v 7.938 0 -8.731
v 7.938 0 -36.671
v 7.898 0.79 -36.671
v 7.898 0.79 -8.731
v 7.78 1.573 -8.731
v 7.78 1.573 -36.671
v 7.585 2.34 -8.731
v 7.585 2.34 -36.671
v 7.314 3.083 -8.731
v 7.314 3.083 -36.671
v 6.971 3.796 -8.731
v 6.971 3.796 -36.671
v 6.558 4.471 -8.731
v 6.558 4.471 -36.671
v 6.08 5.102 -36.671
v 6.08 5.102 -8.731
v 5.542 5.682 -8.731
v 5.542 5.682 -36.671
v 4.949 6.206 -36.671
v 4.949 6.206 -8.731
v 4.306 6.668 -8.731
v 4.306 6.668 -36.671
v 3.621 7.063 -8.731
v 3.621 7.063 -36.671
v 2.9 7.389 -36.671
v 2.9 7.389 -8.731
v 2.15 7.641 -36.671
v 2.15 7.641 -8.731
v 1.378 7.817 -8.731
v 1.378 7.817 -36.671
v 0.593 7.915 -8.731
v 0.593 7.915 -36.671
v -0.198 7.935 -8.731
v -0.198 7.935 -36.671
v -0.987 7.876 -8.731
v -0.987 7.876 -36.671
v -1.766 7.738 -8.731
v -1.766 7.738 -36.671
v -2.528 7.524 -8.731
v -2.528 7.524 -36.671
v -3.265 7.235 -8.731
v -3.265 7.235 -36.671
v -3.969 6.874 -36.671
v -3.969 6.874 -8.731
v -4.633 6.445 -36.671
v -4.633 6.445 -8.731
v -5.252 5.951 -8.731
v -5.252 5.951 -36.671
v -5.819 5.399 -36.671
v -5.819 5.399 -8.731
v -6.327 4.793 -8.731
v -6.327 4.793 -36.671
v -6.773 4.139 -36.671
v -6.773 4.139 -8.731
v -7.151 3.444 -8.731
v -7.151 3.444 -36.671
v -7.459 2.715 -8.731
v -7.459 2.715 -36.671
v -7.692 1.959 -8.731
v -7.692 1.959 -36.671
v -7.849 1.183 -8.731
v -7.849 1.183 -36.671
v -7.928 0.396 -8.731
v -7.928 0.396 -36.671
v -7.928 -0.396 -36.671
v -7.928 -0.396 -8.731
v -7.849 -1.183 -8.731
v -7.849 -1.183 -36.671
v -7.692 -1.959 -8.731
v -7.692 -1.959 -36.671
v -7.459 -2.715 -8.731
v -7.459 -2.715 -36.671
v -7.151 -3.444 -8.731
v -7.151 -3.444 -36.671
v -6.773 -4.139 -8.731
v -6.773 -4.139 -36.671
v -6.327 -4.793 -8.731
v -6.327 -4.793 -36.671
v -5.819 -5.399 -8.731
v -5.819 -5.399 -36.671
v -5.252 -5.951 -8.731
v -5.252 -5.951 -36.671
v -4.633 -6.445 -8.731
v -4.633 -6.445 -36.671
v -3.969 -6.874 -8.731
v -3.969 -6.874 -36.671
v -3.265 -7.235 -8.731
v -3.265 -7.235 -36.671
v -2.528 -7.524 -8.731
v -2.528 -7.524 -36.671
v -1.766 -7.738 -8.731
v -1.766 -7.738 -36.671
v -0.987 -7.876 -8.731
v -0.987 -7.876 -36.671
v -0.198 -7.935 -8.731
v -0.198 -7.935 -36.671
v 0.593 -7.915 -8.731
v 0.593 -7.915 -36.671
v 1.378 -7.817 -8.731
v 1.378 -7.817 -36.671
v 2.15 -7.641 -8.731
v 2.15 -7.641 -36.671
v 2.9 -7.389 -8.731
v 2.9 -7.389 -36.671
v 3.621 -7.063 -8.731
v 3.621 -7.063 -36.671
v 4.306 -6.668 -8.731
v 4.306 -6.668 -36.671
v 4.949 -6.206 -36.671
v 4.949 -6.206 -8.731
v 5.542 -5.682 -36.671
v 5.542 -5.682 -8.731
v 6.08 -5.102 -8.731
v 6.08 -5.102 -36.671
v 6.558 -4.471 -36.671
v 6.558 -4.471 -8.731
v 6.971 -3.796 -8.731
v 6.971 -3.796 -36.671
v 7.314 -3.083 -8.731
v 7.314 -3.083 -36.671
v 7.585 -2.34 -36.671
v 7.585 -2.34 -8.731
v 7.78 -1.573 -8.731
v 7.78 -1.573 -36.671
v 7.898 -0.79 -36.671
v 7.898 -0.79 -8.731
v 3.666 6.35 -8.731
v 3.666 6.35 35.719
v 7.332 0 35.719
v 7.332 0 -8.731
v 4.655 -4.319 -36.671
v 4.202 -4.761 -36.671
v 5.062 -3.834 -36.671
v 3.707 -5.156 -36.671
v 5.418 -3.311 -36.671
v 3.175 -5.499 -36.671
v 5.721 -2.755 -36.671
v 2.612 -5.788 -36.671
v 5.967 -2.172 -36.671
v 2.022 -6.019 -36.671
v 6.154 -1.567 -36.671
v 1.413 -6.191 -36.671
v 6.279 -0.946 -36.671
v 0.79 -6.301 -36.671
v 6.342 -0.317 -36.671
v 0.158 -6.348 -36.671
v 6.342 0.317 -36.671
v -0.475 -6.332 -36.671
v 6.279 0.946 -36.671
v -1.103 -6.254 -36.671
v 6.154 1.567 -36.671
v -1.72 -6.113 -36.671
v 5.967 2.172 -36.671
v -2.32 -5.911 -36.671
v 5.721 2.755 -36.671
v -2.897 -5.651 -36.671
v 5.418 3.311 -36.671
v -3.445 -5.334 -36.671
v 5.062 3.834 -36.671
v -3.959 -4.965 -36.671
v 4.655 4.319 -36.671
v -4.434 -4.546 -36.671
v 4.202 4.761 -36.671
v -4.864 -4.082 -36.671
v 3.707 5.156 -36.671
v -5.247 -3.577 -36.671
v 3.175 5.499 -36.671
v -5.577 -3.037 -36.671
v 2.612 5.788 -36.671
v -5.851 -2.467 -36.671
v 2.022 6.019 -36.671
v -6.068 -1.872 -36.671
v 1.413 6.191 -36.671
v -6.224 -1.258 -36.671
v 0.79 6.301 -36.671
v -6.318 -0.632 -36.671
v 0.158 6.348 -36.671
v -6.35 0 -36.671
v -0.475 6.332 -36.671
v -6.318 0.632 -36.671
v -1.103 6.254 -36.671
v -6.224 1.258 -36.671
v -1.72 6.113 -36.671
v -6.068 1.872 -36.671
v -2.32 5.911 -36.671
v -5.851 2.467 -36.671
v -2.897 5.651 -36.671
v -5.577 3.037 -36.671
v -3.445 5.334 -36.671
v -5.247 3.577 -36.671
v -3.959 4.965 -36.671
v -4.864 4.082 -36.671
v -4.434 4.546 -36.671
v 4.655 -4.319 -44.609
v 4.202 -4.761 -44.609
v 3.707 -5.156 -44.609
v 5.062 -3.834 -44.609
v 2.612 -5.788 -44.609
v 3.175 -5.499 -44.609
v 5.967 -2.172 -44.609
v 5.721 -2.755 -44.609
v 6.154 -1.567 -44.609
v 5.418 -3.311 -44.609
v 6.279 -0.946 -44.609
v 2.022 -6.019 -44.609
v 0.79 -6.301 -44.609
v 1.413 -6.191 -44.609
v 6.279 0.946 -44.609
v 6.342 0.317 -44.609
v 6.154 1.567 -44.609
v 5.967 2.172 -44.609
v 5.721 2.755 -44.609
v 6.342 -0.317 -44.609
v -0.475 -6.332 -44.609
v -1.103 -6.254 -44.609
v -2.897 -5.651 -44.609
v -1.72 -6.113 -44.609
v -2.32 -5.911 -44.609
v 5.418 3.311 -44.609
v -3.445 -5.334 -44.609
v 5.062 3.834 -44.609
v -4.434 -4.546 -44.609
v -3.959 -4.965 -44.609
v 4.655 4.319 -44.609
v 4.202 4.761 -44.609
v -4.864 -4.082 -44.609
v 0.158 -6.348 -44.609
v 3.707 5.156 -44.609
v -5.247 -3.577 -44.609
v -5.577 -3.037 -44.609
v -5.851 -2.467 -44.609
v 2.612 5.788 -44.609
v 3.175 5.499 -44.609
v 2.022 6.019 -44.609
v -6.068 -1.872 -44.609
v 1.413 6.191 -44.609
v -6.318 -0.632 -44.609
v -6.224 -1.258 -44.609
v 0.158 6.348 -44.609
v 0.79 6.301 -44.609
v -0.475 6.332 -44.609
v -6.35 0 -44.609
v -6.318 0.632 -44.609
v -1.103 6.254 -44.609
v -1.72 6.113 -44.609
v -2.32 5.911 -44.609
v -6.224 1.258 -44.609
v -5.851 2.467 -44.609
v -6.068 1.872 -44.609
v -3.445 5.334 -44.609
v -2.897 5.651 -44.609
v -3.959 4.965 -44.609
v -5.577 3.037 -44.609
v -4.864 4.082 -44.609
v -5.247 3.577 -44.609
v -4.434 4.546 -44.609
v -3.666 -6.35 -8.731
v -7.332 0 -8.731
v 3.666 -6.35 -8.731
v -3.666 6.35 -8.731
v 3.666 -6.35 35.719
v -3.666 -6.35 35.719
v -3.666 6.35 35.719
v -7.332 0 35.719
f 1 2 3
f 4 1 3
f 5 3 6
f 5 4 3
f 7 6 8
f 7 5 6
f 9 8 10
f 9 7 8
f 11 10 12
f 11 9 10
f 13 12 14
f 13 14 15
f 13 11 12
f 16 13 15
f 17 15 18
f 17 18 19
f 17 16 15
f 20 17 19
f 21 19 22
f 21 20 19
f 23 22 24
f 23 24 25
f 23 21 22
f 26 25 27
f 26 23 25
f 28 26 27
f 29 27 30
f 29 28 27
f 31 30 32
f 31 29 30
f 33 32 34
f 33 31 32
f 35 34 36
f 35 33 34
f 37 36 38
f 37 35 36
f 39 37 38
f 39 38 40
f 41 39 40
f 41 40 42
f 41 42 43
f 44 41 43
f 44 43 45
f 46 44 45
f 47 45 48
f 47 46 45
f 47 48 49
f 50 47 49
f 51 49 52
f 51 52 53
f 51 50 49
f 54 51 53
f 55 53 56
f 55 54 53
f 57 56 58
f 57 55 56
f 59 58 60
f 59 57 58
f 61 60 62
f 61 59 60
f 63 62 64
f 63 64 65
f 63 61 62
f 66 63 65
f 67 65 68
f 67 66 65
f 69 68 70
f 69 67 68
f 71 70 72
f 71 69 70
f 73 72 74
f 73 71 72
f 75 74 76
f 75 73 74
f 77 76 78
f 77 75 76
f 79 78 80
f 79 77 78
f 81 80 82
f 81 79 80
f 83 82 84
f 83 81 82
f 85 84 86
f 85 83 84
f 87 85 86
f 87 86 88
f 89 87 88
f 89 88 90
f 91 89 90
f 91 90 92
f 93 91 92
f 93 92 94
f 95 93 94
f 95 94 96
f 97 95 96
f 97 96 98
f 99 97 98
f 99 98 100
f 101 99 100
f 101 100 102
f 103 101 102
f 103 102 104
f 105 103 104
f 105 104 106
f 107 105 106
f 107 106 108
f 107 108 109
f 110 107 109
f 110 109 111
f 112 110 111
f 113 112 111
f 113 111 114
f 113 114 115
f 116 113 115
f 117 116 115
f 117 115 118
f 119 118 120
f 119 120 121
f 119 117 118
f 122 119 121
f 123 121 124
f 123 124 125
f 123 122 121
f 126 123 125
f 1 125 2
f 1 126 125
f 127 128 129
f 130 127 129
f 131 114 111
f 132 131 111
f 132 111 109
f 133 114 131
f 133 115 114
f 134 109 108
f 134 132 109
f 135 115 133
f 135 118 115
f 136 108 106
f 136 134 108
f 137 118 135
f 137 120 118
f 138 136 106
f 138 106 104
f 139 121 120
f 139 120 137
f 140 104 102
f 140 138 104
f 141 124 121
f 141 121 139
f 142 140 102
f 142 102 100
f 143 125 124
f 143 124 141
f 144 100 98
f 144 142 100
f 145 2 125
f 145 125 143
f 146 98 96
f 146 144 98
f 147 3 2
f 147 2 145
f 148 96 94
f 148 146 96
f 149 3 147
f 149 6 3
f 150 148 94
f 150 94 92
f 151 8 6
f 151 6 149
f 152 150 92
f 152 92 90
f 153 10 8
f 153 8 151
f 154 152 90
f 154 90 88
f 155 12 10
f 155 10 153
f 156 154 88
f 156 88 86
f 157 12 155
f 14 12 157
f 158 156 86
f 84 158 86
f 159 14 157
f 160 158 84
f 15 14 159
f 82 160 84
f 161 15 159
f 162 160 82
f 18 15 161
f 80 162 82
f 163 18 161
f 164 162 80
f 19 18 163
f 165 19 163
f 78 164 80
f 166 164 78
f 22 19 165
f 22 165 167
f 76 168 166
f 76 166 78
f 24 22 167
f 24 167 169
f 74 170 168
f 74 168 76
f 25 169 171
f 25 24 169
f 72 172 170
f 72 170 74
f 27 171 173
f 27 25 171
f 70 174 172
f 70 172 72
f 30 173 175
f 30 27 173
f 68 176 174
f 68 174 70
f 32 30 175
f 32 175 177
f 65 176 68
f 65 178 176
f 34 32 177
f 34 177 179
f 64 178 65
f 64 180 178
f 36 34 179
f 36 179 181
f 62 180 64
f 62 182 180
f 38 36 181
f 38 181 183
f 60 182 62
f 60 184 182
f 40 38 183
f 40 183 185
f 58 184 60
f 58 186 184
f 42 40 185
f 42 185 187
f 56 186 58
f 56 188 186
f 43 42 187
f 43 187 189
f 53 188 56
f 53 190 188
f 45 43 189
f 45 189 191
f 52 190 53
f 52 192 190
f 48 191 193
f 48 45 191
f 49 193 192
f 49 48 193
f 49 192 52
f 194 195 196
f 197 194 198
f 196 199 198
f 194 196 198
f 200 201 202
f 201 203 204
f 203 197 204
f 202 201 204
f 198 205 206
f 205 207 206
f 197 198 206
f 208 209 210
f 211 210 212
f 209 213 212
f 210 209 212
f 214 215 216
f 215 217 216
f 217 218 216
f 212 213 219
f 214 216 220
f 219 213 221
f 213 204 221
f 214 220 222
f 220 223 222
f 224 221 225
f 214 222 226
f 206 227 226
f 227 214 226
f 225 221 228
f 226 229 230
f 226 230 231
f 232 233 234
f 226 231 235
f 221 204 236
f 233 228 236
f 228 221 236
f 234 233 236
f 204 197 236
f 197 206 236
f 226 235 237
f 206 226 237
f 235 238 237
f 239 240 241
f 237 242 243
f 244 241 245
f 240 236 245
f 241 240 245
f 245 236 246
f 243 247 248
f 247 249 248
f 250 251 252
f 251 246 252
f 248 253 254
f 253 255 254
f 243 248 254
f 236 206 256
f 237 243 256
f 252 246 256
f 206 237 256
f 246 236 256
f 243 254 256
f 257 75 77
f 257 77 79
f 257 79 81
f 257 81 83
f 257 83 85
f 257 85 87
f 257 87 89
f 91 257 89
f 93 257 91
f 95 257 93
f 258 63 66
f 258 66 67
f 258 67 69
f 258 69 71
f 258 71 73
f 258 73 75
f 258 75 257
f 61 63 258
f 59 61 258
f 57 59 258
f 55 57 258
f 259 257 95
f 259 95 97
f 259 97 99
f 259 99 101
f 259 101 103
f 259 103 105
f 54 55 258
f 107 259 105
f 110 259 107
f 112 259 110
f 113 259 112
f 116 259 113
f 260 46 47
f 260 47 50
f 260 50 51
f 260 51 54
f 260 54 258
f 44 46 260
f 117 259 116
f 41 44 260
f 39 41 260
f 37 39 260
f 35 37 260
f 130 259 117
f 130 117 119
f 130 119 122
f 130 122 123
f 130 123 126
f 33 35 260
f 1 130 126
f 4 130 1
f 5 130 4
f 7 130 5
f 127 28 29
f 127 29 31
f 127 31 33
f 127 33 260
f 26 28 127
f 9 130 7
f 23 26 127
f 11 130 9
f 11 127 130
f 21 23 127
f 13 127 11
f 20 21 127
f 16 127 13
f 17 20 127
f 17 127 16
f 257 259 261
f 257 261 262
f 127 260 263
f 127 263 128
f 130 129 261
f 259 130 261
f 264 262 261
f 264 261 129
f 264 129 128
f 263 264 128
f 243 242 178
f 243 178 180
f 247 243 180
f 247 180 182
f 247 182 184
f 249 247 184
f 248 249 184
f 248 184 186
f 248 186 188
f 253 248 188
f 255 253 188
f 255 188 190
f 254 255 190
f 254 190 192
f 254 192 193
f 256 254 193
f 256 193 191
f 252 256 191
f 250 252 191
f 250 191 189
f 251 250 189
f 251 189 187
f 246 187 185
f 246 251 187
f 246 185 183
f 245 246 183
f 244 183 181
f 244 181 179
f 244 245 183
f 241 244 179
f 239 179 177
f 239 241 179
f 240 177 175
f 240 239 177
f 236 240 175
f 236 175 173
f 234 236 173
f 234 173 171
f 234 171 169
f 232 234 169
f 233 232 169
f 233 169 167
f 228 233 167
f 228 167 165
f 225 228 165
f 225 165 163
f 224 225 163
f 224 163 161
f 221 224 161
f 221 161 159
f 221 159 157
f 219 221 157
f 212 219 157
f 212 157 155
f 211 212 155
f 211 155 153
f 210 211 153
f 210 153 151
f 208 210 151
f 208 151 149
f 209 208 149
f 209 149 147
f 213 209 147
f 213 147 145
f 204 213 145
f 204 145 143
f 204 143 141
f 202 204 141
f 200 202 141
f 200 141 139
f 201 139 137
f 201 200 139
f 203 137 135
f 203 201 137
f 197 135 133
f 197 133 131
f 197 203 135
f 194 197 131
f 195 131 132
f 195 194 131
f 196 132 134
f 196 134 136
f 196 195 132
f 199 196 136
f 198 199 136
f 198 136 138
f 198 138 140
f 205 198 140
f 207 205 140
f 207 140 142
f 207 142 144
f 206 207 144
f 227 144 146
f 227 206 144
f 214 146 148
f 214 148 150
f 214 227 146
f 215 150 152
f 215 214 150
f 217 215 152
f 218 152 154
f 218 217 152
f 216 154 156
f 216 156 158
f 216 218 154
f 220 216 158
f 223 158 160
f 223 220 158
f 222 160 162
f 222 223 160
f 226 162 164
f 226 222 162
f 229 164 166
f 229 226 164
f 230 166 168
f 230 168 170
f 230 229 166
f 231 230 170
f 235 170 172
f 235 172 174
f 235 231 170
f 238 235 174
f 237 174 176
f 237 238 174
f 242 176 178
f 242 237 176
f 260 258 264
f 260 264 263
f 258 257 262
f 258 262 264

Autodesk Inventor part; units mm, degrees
ref_plane "YZ Plane" through (0, 0, 0) normal (1, 0, 0) x (0, 1, 0)
ref_plane "XZ Plane" through (0, 0, 0) normal (0, 1, 0) x (-1, 0, 0)
ref_plane "XY Plane" through (0, 0, 0) normal (0, 0, 1) x (1, 0, 0)
sketch "Sketch1" plane through (0, 0, 0) normal (0, 0, 1) x (1, 0, 0)
  circle A0 centre (0, 0) radius 7.9375
  dimension "d0" = 15.875
extrude "Extrusion1" add sketch "Sketch1" along normal mid plane 90.4875
sketch "Sketch2" plane through (0, 0, 45.2437) normal (0, 0, 1) x (1, 0, 0)
  line L0 (-3.6662, 6.35) -> (3.6662, 6.35)
  line L1 (3.6662, 6.35) -> (7.3323, 0)
  line L2 (7.3323, 0) -> (3.6662, -6.35)
  line L3 (3.6662, -6.35) -> (-3.6662, -6.35)
  line L4 (-3.6662, -6.35) -> (-7.3323, 0)
  line L5 (-7.3323, 0) -> (-3.6662, 6.35)
  circle A0 centre (0, 0) radius 7.9375 projected
  point P0 (0, -6.35)
  point P1 (0, 6.35)
  dimension "d3" = 12.7
extrude "Extrusion2" cut sketch "Sketch2" against normal blind 53.975
sketch "Sketch3" plane through (0, 0, 45.2437) normal (0, 0, 1) x (1, 0, 0)
  circle A0 centre (0, 0) radius 6.35
  circle A1 centre (0, 0) radius 7.9375 projected
  line L0 (3.6662, 6.35) -> (-3.6662, 6.35) projected
  line L1 (7.3323, 0) -> (3.6662, 6.35) projected
  line L2 (3.6662, -6.35) -> (7.3323, 0) projected
  line L3 (-3.6662, -6.35) -> (3.6662, -6.35) projected
  line L4 (-7.3323, 0) -> (-3.6662, -6.35) projected
  line L5 (-3.6662, 6.35) -> (-7.3323, 0) projected
  point P0 (-5.4993, 3.175)
  point P1 (0, 6.35)
  point P2 (-5.4993, -3.175)
  point P3 (0, -6.35)
  point P4 (5.4993, -3.175)
  point P5 (5.4993, 3.175)
  dimension "d6" = 12.7
extrude "Extrusion3" cut sketch "Sketch3" against normal blind 6.35 contours A0 L1 L2 | A0 L0 L1 | L2 L3 A0 | A0 L5 L0 | L3 L4 A0 | A0 L4 L5
sketch "Sketch6" plane through (0, 0, 0) normal (1, 0, 0) x (0, 1, 0)
  line L0 (7.9375, -45.2437) -> (-7.9375, -45.2437) construction
  line L1 (-7.9375, -45.2437) -> (-7.9375, -8.7312) construction
  line L2 (-7.9375, -8.7312) -> (-6.35, -8.7312) construction
  line L3 (-6.35, -8.7312) -> (-6.35, 38.8938) construction
  line L4 (-6.35, 38.8938) -> (-6.35, 45.2437) construction
  line L5 (-6.35, 45.2437) -> (6.35, 45.2437) construction
  line L6 (6.35, 45.2437) -> (6.35, 38.8938) construction
  line L7 (6.35, 38.8938) -> (6.35, -8.7312) construction
  line L8 (6.35, -8.7312) -> (7.9375, -8.7312) construction
  line L9 (7.9375, -8.7312) -> (7.9375, -45.2437) construction
  line L10 (6.35, 45.2437) -> (-6.35, 45.2437)
  line L11 (-6.35, 45.2437) -> (-6.35, 35.7187)
  line L12 (-6.35, 35.7187) -> (6.35, 35.7188)
  line L13 (6.35, 35.7188) -> (6.35, 45.2437)
  line L14 (7.9375, -45.2437) -> (-7.9375, -45.2437)
  line L15 (-7.9375, -45.2437) -> (-7.9375, -44.6088)
  line L16 (-7.9375, -44.6088) -> (7.9375, -44.6088)
  line L17 (7.9375, -44.6088) -> (7.9375, -45.2437)
  point P0 (0, 0)
  dimension "d15" = 9.525
  dimension "d16" = 0.635
extrude "Extrusion6" cut sketch "Sketch6" along normal through all both and the other way through all
sketch "Sketch7" plane through (0, 0, -44.6088) normal (0, 0, -1) x (-1, 0, 0)
  circle A0 centre (0, 0) radius 6.35
  circle A1 centre (0, 0) radius 7.9375
  circle A2 centre (0, 0) radius 7.9375 construction
  dimension "d19" = 12.7
extrude "Extrusion7" cut sketch "Sketch7" against normal blind 7.9375
properties part number "EL2-C2-002" material "Aluminum 6061"
